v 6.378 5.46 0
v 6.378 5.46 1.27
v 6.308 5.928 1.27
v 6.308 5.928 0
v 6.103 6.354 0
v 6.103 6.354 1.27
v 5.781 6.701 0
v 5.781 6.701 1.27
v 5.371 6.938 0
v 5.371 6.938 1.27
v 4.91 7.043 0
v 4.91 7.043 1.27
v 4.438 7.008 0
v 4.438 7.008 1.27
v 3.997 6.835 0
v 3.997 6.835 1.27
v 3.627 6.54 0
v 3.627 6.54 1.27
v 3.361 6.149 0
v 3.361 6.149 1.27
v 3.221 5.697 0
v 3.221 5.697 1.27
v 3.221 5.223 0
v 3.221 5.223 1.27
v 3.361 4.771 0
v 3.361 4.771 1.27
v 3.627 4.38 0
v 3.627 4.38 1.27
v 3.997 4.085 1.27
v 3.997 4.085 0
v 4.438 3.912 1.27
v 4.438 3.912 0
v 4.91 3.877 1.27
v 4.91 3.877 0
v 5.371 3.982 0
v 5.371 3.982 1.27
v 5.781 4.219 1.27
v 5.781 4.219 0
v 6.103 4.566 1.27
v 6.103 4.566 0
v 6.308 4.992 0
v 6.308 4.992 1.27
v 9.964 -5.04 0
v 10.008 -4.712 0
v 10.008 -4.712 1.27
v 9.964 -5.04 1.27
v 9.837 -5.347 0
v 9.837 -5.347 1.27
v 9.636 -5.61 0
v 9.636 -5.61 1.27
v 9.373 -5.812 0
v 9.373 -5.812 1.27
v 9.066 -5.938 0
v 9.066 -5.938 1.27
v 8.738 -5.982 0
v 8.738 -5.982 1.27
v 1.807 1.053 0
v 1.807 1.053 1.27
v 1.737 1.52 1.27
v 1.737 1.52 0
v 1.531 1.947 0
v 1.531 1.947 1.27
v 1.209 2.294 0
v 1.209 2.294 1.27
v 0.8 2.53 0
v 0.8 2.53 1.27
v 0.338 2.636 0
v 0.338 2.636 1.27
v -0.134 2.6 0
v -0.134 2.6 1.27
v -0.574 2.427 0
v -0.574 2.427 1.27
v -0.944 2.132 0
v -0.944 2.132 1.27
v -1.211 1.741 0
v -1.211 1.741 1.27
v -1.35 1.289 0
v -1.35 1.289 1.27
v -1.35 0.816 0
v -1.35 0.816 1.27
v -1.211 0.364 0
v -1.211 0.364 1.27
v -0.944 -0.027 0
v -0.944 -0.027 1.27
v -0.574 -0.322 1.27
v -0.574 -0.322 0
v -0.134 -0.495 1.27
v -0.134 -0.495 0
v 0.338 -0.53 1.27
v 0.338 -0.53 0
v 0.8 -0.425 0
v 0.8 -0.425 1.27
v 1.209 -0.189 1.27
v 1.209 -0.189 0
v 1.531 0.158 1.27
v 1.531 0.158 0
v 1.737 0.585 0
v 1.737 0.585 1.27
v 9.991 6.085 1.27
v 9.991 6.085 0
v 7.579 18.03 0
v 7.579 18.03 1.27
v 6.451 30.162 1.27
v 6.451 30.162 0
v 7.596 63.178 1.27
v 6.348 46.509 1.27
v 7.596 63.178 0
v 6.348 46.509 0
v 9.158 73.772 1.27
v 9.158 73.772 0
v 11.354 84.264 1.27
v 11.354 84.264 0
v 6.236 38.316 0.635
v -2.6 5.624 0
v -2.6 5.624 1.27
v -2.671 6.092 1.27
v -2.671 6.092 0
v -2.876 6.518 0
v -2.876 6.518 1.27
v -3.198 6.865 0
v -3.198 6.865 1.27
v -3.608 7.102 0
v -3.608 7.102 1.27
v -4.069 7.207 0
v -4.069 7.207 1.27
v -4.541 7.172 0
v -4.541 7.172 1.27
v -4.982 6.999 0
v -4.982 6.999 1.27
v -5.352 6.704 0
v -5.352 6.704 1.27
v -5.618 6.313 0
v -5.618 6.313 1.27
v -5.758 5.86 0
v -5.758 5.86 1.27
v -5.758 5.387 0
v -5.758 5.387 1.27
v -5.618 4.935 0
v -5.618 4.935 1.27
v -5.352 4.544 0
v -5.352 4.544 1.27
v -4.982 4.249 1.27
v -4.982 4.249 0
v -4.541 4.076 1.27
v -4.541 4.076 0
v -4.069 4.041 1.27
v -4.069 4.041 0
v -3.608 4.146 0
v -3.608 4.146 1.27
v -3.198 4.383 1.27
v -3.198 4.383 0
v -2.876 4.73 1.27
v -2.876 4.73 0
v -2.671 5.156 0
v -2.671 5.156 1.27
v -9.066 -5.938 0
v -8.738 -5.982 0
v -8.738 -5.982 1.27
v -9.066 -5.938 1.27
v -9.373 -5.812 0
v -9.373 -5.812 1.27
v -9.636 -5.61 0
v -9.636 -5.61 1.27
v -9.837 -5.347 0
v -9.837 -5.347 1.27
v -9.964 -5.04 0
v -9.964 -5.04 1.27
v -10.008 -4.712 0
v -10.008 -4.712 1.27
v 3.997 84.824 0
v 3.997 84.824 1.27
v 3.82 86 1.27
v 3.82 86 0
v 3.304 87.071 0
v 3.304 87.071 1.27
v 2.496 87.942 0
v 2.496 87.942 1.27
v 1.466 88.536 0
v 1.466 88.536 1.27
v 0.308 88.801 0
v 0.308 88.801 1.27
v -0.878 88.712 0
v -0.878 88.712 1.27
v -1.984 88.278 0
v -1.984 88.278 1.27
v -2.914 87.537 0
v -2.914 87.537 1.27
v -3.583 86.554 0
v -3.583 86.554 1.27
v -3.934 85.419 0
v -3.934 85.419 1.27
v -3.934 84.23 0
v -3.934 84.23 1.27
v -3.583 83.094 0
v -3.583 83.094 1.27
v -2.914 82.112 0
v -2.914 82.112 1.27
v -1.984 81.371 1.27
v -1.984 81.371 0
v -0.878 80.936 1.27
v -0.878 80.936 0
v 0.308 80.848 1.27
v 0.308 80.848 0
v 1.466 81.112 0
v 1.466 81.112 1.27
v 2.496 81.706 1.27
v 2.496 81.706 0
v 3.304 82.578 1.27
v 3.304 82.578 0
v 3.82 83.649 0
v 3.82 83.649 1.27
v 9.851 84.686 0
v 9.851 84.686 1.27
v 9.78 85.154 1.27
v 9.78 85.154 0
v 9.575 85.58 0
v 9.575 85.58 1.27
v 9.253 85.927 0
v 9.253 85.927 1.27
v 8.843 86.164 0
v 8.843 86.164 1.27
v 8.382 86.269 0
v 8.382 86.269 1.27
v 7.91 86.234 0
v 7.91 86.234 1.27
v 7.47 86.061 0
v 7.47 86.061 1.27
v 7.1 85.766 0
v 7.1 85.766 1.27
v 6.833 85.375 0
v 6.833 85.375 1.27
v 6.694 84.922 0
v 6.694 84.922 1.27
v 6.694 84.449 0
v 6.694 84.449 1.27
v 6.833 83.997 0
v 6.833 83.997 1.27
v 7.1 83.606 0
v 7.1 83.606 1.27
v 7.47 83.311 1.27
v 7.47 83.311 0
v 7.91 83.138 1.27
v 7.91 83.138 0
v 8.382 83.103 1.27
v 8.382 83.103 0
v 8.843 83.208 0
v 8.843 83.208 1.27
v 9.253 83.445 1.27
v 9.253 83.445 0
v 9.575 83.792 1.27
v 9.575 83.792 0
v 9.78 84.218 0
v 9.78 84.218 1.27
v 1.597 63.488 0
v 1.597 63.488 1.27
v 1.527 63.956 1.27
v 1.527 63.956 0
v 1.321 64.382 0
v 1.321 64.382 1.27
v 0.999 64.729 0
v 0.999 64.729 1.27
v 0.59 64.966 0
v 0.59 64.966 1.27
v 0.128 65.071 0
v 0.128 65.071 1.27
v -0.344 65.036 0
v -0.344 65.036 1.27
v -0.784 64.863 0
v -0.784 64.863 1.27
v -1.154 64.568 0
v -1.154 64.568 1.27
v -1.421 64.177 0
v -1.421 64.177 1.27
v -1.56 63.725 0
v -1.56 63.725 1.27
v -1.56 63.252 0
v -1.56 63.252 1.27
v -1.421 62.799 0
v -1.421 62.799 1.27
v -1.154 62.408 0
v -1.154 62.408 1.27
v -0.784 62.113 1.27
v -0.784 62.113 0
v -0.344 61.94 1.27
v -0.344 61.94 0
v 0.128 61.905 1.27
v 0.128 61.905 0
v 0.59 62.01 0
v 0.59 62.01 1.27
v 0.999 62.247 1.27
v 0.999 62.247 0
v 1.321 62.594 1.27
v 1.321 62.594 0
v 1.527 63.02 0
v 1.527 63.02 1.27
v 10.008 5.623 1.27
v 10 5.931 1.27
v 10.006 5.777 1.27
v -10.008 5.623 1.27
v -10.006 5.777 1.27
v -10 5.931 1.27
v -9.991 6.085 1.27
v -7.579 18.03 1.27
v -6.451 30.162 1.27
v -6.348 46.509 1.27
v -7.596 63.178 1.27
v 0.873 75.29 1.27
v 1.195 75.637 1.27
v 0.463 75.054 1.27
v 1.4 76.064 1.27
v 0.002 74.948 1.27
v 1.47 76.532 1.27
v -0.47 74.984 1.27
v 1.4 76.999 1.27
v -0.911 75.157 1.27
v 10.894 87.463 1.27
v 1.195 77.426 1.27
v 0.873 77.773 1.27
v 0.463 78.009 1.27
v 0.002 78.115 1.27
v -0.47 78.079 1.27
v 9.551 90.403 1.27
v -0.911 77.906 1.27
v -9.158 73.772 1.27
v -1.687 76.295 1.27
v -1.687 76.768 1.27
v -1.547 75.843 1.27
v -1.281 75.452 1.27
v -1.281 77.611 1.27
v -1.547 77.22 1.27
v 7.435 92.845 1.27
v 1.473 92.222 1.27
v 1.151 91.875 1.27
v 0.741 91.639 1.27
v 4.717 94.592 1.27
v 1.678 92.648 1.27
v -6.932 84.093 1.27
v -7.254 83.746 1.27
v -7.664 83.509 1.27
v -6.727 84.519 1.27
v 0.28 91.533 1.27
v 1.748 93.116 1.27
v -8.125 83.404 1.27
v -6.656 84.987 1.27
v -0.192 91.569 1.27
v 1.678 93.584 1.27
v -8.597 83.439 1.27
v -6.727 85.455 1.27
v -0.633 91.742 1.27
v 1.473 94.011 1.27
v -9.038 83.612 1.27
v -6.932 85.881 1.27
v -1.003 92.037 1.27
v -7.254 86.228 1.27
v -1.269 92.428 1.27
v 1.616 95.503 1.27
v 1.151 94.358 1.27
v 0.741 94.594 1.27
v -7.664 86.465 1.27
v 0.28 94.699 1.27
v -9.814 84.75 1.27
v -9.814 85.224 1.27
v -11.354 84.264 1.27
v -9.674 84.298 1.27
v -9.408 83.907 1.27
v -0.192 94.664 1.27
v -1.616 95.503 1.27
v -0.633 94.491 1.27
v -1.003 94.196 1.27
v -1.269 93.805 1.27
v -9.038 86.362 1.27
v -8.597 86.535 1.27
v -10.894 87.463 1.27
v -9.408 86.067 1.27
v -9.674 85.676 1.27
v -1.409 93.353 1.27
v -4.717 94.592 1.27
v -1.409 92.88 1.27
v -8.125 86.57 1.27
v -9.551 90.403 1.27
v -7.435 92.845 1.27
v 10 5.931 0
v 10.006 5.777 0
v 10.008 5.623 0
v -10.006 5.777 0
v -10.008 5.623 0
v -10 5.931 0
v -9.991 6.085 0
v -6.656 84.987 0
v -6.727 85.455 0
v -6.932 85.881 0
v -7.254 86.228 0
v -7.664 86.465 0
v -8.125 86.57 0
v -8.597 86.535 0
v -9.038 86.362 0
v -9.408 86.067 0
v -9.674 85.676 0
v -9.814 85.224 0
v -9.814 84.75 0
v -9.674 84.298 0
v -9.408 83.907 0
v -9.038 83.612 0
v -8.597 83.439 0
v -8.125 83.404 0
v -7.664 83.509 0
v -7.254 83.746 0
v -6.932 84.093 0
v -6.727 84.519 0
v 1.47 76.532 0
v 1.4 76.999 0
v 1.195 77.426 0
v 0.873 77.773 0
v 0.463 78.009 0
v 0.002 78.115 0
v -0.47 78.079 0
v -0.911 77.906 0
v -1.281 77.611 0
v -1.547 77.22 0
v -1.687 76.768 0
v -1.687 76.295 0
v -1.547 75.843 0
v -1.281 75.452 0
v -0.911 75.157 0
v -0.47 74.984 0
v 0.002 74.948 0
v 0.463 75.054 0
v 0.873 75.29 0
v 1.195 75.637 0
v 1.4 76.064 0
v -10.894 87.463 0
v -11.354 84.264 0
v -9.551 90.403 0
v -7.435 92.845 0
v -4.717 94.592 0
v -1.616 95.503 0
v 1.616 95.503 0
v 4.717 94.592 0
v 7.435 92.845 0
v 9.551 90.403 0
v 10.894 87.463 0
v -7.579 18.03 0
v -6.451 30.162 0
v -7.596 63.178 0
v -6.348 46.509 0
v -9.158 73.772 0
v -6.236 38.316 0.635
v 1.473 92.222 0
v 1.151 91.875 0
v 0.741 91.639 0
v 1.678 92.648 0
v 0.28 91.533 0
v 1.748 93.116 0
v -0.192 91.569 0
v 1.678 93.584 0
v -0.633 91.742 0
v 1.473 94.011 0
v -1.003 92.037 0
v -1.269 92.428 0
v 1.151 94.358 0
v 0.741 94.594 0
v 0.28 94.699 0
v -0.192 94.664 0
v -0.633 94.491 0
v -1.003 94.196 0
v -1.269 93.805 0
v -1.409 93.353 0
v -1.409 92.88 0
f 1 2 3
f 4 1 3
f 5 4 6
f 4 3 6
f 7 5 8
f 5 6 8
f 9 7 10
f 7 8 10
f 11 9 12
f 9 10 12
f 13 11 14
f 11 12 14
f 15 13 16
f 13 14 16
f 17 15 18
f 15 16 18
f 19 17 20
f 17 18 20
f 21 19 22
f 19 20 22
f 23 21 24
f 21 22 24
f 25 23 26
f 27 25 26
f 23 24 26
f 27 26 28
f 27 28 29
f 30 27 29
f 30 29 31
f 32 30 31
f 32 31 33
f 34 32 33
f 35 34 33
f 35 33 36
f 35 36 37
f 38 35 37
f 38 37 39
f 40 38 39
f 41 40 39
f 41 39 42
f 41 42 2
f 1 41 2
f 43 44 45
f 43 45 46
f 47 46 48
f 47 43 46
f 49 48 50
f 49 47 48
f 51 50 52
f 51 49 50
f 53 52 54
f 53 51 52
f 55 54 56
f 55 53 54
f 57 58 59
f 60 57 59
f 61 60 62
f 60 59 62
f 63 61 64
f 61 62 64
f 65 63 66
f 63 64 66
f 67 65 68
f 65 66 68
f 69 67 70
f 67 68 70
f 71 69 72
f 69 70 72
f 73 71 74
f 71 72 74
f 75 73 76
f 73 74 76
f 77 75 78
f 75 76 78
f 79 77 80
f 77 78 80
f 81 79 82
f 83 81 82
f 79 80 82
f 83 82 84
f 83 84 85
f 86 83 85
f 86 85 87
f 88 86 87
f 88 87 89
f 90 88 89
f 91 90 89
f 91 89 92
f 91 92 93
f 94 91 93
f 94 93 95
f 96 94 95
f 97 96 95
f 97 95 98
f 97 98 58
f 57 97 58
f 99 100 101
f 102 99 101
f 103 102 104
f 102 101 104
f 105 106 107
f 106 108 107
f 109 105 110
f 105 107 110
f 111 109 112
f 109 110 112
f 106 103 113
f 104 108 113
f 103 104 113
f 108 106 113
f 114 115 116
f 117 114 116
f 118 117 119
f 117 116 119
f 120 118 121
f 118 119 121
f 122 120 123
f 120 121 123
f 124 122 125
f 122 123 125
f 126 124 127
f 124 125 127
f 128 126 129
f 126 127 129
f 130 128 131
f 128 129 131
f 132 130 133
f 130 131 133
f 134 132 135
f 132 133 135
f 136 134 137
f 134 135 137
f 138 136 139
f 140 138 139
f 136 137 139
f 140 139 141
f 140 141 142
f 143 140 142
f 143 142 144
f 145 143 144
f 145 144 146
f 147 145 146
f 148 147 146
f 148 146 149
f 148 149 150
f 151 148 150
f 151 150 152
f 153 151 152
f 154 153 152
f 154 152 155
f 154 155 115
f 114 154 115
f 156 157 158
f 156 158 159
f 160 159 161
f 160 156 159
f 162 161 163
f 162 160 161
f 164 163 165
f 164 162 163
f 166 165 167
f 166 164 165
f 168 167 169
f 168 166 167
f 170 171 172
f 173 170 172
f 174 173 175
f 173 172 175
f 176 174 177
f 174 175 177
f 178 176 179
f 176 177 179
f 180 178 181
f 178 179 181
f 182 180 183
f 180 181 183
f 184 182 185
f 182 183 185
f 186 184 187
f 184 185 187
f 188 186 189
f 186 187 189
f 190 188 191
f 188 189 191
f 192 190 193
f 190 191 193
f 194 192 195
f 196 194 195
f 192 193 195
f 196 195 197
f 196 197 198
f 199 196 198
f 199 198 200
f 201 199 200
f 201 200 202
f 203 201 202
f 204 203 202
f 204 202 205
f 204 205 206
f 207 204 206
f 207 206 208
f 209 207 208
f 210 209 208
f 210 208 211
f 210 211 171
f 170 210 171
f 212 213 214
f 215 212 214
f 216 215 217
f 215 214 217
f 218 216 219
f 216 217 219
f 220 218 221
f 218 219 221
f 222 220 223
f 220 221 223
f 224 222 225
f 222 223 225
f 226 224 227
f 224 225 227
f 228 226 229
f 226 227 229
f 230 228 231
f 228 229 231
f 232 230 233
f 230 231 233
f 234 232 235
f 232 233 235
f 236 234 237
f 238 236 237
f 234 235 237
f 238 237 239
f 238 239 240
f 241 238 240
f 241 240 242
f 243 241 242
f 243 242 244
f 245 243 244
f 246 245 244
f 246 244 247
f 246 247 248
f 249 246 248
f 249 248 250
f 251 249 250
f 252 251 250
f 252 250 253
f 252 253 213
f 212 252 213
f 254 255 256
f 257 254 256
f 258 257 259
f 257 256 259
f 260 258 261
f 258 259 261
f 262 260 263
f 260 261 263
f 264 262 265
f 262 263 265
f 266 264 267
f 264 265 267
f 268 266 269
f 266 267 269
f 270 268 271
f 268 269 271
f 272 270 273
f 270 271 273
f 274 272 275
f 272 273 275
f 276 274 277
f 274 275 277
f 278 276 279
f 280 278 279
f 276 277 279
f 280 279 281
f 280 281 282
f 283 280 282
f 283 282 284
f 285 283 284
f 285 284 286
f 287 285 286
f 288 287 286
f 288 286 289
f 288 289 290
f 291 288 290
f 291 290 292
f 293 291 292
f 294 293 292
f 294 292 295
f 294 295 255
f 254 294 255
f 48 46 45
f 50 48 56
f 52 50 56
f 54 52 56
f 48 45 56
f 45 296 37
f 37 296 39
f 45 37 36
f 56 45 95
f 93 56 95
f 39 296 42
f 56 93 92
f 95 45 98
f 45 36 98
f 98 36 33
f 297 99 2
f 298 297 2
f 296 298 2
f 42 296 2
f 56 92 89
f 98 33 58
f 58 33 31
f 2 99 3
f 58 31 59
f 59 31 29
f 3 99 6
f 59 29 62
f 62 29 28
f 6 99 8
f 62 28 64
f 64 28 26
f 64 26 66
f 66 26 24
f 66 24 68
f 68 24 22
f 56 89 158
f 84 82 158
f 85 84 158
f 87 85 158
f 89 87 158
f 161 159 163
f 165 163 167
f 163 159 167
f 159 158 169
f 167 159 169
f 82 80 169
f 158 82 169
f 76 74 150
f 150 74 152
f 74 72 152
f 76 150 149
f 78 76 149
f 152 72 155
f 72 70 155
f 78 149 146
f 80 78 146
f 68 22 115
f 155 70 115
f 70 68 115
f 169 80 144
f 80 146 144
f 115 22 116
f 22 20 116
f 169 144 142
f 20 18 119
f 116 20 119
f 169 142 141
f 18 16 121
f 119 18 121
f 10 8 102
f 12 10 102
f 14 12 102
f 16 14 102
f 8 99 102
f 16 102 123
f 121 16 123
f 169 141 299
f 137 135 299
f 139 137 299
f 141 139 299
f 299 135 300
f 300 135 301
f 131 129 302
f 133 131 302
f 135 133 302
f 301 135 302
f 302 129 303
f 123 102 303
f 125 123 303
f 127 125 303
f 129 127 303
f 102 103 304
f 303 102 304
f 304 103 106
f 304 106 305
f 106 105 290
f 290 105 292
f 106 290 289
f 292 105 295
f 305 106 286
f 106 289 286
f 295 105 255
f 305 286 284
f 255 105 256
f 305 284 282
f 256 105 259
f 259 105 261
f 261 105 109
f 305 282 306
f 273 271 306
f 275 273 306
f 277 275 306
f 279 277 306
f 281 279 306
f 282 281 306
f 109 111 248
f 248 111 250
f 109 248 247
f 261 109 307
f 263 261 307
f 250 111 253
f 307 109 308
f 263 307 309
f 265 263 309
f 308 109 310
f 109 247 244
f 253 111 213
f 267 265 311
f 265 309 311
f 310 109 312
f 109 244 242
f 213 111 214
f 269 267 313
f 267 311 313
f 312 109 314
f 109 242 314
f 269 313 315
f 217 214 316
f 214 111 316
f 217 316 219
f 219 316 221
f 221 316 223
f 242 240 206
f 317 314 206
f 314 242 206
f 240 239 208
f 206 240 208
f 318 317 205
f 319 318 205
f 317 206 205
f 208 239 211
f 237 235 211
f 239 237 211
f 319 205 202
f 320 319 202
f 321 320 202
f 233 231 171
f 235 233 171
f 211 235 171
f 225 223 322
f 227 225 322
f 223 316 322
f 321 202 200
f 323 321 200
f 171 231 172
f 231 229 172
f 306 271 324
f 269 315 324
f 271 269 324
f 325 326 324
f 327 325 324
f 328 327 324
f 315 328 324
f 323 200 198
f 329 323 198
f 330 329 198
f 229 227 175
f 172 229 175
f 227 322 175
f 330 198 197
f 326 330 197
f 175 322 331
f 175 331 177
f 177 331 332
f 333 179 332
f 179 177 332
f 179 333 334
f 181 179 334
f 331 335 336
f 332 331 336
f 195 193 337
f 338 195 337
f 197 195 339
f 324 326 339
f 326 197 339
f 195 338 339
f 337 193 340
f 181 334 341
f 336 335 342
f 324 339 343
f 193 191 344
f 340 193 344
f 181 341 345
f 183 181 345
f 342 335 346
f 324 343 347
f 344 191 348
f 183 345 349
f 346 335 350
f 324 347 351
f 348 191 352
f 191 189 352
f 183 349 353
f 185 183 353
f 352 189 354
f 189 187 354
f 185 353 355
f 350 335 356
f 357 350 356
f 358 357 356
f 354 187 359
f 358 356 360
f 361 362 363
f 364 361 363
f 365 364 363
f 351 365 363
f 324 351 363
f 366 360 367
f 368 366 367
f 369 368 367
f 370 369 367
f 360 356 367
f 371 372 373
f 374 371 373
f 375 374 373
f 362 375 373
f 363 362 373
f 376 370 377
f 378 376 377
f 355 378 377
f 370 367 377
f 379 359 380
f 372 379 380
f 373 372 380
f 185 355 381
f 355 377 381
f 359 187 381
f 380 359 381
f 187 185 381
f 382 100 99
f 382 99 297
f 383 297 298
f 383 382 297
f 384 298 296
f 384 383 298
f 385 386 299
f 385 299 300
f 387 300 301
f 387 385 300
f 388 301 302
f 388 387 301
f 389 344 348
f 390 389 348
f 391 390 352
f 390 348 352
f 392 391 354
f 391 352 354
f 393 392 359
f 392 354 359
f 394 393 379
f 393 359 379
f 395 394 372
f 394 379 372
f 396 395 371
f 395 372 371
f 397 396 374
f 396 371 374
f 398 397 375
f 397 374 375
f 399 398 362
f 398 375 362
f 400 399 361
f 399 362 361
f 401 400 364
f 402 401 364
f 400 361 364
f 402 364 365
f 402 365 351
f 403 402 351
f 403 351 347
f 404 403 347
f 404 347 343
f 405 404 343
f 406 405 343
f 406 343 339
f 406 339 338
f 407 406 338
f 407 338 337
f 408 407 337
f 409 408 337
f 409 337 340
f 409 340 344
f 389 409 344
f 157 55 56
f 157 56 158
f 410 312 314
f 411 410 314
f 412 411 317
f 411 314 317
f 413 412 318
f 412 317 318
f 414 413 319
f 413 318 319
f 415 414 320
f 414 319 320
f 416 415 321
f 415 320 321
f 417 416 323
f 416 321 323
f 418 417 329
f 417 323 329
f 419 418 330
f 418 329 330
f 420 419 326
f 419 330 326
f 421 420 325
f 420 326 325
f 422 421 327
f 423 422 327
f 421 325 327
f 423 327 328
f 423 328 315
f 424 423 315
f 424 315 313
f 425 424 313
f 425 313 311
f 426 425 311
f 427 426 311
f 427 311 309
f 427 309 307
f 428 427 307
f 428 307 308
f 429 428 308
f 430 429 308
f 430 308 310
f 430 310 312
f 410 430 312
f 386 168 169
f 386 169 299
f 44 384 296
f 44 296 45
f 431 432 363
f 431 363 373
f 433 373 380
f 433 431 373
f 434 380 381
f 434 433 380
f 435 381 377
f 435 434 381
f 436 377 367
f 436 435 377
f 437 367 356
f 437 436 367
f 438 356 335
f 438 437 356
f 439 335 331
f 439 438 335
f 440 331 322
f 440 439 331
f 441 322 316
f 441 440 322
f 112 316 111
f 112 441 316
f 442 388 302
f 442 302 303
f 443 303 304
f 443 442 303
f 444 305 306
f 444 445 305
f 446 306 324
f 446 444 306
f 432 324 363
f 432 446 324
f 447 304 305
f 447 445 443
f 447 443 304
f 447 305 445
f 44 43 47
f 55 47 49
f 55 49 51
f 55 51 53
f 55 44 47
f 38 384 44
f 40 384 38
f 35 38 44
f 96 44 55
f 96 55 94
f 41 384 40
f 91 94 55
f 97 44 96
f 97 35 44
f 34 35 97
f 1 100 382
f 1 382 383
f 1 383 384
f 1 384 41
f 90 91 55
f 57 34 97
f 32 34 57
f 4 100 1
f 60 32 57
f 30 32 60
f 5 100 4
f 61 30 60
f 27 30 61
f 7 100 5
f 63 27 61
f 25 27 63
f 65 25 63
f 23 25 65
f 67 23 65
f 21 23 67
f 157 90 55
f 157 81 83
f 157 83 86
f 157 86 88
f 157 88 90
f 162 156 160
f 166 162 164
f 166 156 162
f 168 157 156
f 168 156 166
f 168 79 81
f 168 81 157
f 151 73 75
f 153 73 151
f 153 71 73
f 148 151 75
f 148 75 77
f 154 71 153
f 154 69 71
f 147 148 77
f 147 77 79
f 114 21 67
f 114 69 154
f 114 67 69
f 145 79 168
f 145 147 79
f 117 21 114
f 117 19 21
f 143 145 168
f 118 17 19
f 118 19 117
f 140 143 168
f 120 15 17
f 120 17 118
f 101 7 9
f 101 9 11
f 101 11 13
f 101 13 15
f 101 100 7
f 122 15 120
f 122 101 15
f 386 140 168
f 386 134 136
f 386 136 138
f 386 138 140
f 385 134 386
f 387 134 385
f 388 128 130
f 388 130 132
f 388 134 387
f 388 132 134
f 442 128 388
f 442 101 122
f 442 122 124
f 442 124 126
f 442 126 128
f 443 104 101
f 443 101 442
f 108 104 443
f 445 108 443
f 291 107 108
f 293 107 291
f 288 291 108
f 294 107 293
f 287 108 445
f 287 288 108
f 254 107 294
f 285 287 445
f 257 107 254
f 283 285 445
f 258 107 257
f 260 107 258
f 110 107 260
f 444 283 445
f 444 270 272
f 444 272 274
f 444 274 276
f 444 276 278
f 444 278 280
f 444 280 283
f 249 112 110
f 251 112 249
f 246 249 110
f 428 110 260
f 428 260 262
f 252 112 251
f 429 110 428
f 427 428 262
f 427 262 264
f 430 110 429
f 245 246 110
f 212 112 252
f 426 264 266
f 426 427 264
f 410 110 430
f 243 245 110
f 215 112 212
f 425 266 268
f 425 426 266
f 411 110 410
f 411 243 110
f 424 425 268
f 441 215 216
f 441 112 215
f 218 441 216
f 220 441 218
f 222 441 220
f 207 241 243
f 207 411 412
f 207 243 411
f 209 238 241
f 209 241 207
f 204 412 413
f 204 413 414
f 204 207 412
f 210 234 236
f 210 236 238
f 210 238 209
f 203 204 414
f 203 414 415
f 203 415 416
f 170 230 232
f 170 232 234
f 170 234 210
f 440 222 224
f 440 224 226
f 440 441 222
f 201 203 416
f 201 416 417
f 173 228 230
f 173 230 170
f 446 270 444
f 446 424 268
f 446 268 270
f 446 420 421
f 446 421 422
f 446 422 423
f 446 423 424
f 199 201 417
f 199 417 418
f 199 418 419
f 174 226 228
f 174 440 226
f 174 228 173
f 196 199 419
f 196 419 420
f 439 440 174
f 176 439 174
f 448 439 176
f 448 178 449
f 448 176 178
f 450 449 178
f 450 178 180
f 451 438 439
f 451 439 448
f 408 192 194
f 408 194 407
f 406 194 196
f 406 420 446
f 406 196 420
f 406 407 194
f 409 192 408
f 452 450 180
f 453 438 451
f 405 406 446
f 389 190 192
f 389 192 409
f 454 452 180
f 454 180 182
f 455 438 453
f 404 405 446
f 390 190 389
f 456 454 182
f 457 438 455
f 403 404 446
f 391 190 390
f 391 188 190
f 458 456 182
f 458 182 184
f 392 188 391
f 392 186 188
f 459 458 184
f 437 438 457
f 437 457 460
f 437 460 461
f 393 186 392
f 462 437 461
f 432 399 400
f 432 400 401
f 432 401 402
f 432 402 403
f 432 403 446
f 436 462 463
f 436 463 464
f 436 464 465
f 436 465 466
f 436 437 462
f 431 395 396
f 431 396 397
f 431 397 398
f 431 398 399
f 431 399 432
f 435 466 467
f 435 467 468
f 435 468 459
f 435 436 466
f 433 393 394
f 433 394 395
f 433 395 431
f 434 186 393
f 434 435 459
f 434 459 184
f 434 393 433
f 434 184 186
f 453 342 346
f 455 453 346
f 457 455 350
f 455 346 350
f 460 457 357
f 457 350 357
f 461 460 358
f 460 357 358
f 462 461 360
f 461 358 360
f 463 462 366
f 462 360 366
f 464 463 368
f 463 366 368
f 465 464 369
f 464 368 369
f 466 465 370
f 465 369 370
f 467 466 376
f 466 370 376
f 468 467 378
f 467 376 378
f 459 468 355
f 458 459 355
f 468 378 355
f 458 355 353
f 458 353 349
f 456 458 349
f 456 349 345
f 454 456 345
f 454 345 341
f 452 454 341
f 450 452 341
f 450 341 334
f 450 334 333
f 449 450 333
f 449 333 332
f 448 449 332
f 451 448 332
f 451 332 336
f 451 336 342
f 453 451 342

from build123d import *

# Parameters (mm, degrees)
BOSS_EXTRUDE1_DEPTH = 1.27
SKETCH3_R           = 1.5875
SKETCH3_R_2         = 3.9878
CUT_EXTRUDE1_DEPTH  = 97.298395578


with BuildPart() as part:
    # Sketch1 → Boss-Extrude1 (new body)
    with BuildSketch(Plane.XY):
        with BuildLine():
            Line((10.0076, 5.622584698), (10.0076, -4.7117))
            ThreePointArc((10.0076, -4.7117), (9.635625612, -5.609725612), (8.7376, -5.9817))
            Line((8.7376, -5.9817), (-8.7376, -5.9817))
            ThreePointArc((-8.7376, -5.9817), (-9.635625612, -5.609725612), (-10.0076, -4.7117))
            Line((-10.0076, -4.7117), (-10.0076, 5.622584698))
            ThreePointArc((-10.0076, 5.622584698), (-10.003391038, 5.85374719), (-9.990769733, 6.084603239))
            add(Edge.make_bspline(
                [(-9.990769733, 6.084603239), (-7.167817584, 16.591535459), (-5.051519119, 42.938826991), (-7.717998868, 69.224459282), (-11.3538, 84.2645)],
                knots=[0, 0, 0, 0, 0.412468481, 1, 1, 1, 1], degree=3))
            ThreePointArc((-11.3538, 84.2645), (0, 95.6183), (11.3538, 84.2645))
            add(Edge.make_bspline(
                [(9.990769733, 6.084603239), (7.167817584, 16.591535459), (5.051519119, 42.938826991), (7.717998868, 69.224459282), (11.3538, 84.2645)],
                knots=[0, 0, 0, 0, 0.412468481, 1, 1, 1, 1], degree=3))
            ThreePointArc((9.990769733, 6.084603239), (10.003391038, 5.85374719), (10.0076, 5.622584698))
        make_face()
    extrude(amount=BOSS_EXTRUDE1_DEPTH)

    # Sketch3 → Cut-Extrude1 (cut, through all)
    with BuildSketch(Plane.XY.offset(1.27)):
        with Locations((0.009537188, 63.488174324)):
            Circle(SKETCH3_R)
        with Locations((-4.18787141, 5.623885886)):
            Circle(SKETCH3_R)
        with Locations((0.009537188, 84.824174324)):
            Circle(SKETCH3_R_2)
        with Locations((4.790889658, 5.460027166)):
            Circle(SKETCH3_R)
        with Locations((0.219579764, 1.052575992)):
            Circle(SKETCH3_R)
        with Locations((8.263377785, 84.685825499)):
            Circle(SKETCH3_R)
        with Locations((-0.117124746, 76.531516693)):
            Circle(SKETCH3_R)
        with Locations((-8.243855334, 84.987075758)):
            Circle(SKETCH3_R)
        with Locations((0.160867255, 93.116418474)):
            Circle(SKETCH3_R)
    extrude(amount=-CUT_EXTRUDE1_DEPTH, mode=Mode.SUBTRACT)


solid = part.part
